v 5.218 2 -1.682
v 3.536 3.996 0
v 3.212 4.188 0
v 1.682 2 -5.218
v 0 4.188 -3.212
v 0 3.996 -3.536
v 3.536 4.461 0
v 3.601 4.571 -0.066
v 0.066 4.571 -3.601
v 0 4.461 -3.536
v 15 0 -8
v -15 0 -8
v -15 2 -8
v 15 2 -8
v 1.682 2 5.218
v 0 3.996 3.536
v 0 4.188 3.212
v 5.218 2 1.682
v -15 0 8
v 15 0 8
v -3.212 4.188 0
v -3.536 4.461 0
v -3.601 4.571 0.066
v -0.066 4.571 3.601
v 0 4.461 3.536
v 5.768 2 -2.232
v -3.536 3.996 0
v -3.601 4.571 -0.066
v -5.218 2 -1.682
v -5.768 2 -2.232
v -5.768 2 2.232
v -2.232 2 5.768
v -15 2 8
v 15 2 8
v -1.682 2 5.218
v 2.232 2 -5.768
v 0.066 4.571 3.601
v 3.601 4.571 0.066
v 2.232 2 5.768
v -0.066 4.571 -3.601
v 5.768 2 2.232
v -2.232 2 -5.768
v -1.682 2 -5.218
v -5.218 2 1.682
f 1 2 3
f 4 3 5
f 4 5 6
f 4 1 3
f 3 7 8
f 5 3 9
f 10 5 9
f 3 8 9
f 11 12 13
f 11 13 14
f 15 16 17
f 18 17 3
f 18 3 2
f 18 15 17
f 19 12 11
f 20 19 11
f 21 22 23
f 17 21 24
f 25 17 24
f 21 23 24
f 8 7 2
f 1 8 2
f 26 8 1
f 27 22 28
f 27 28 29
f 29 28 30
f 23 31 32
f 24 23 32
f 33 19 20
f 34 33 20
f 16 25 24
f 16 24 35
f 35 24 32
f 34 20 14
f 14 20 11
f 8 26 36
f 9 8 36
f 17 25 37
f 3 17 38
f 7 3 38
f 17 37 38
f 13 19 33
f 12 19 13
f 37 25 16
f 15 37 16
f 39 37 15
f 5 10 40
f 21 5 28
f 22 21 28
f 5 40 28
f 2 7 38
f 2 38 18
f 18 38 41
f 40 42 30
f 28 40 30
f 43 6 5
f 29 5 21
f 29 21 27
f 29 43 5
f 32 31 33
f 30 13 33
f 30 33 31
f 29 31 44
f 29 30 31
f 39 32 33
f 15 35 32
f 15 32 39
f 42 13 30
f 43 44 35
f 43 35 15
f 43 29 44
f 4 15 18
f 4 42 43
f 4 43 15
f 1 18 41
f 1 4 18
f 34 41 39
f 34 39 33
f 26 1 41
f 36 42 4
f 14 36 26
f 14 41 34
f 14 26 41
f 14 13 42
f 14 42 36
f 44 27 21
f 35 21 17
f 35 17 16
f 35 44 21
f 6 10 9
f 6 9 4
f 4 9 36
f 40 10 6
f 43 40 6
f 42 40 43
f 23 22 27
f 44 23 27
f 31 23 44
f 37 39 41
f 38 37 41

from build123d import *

# Parameters (mm, degrees)
SKETCH1_W           = 30
SKETCH1_H           = 16
BOSS_EXTRUDE1_DEPTH = 2
SKETCH4_W           = 5
SKETCH4_H           = 4
BOSS_EXTRUDE2_DEPTH = 0.5
CIRPATTERN1_COUNT   = 4


with BuildPart() as part:
    # Sketch1 → Boss-Extrude1 (new body)
    with BuildSketch(Plane(origin=(0, 0, 0), x_dir=(1, 0, 0), z_dir=(0, 1, 0))):
        Rectangle(SKETCH1_W, SKETCH1_H)
    extrude(amount=BOSS_EXTRUDE1_DEPTH)

    # Sketch4 → Boss-Extrude2 (add)
    with BuildSketch(Plane(origin=(-2.349067885, 3.959105139, 2.349067885), x_dir=(0.7071067811865479, 0, 0.7071067811865471), z_dir=(0.4545194776720462, -0.7660444431189748, -0.4545194776720467))):
        with Locations((0, 1.047826544)):
            Rectangle(SKETCH4_W, SKETCH4_H)
    boss_extrude2 = extrude(amount=BOSS_EXTRUDE2_DEPTH)

    # CirPattern1: Boss-Extrude2 ×4 about axis
    cirpattern1_axis = Axis((0, 0, 0), (0, 1, 0))
    for i in range(1, CIRPATTERN1_COUNT):
        add(boss_extrude2.rotate(cirpattern1_axis, i * 360 / CIRPATTERN1_COUNT))


solid = part.part
